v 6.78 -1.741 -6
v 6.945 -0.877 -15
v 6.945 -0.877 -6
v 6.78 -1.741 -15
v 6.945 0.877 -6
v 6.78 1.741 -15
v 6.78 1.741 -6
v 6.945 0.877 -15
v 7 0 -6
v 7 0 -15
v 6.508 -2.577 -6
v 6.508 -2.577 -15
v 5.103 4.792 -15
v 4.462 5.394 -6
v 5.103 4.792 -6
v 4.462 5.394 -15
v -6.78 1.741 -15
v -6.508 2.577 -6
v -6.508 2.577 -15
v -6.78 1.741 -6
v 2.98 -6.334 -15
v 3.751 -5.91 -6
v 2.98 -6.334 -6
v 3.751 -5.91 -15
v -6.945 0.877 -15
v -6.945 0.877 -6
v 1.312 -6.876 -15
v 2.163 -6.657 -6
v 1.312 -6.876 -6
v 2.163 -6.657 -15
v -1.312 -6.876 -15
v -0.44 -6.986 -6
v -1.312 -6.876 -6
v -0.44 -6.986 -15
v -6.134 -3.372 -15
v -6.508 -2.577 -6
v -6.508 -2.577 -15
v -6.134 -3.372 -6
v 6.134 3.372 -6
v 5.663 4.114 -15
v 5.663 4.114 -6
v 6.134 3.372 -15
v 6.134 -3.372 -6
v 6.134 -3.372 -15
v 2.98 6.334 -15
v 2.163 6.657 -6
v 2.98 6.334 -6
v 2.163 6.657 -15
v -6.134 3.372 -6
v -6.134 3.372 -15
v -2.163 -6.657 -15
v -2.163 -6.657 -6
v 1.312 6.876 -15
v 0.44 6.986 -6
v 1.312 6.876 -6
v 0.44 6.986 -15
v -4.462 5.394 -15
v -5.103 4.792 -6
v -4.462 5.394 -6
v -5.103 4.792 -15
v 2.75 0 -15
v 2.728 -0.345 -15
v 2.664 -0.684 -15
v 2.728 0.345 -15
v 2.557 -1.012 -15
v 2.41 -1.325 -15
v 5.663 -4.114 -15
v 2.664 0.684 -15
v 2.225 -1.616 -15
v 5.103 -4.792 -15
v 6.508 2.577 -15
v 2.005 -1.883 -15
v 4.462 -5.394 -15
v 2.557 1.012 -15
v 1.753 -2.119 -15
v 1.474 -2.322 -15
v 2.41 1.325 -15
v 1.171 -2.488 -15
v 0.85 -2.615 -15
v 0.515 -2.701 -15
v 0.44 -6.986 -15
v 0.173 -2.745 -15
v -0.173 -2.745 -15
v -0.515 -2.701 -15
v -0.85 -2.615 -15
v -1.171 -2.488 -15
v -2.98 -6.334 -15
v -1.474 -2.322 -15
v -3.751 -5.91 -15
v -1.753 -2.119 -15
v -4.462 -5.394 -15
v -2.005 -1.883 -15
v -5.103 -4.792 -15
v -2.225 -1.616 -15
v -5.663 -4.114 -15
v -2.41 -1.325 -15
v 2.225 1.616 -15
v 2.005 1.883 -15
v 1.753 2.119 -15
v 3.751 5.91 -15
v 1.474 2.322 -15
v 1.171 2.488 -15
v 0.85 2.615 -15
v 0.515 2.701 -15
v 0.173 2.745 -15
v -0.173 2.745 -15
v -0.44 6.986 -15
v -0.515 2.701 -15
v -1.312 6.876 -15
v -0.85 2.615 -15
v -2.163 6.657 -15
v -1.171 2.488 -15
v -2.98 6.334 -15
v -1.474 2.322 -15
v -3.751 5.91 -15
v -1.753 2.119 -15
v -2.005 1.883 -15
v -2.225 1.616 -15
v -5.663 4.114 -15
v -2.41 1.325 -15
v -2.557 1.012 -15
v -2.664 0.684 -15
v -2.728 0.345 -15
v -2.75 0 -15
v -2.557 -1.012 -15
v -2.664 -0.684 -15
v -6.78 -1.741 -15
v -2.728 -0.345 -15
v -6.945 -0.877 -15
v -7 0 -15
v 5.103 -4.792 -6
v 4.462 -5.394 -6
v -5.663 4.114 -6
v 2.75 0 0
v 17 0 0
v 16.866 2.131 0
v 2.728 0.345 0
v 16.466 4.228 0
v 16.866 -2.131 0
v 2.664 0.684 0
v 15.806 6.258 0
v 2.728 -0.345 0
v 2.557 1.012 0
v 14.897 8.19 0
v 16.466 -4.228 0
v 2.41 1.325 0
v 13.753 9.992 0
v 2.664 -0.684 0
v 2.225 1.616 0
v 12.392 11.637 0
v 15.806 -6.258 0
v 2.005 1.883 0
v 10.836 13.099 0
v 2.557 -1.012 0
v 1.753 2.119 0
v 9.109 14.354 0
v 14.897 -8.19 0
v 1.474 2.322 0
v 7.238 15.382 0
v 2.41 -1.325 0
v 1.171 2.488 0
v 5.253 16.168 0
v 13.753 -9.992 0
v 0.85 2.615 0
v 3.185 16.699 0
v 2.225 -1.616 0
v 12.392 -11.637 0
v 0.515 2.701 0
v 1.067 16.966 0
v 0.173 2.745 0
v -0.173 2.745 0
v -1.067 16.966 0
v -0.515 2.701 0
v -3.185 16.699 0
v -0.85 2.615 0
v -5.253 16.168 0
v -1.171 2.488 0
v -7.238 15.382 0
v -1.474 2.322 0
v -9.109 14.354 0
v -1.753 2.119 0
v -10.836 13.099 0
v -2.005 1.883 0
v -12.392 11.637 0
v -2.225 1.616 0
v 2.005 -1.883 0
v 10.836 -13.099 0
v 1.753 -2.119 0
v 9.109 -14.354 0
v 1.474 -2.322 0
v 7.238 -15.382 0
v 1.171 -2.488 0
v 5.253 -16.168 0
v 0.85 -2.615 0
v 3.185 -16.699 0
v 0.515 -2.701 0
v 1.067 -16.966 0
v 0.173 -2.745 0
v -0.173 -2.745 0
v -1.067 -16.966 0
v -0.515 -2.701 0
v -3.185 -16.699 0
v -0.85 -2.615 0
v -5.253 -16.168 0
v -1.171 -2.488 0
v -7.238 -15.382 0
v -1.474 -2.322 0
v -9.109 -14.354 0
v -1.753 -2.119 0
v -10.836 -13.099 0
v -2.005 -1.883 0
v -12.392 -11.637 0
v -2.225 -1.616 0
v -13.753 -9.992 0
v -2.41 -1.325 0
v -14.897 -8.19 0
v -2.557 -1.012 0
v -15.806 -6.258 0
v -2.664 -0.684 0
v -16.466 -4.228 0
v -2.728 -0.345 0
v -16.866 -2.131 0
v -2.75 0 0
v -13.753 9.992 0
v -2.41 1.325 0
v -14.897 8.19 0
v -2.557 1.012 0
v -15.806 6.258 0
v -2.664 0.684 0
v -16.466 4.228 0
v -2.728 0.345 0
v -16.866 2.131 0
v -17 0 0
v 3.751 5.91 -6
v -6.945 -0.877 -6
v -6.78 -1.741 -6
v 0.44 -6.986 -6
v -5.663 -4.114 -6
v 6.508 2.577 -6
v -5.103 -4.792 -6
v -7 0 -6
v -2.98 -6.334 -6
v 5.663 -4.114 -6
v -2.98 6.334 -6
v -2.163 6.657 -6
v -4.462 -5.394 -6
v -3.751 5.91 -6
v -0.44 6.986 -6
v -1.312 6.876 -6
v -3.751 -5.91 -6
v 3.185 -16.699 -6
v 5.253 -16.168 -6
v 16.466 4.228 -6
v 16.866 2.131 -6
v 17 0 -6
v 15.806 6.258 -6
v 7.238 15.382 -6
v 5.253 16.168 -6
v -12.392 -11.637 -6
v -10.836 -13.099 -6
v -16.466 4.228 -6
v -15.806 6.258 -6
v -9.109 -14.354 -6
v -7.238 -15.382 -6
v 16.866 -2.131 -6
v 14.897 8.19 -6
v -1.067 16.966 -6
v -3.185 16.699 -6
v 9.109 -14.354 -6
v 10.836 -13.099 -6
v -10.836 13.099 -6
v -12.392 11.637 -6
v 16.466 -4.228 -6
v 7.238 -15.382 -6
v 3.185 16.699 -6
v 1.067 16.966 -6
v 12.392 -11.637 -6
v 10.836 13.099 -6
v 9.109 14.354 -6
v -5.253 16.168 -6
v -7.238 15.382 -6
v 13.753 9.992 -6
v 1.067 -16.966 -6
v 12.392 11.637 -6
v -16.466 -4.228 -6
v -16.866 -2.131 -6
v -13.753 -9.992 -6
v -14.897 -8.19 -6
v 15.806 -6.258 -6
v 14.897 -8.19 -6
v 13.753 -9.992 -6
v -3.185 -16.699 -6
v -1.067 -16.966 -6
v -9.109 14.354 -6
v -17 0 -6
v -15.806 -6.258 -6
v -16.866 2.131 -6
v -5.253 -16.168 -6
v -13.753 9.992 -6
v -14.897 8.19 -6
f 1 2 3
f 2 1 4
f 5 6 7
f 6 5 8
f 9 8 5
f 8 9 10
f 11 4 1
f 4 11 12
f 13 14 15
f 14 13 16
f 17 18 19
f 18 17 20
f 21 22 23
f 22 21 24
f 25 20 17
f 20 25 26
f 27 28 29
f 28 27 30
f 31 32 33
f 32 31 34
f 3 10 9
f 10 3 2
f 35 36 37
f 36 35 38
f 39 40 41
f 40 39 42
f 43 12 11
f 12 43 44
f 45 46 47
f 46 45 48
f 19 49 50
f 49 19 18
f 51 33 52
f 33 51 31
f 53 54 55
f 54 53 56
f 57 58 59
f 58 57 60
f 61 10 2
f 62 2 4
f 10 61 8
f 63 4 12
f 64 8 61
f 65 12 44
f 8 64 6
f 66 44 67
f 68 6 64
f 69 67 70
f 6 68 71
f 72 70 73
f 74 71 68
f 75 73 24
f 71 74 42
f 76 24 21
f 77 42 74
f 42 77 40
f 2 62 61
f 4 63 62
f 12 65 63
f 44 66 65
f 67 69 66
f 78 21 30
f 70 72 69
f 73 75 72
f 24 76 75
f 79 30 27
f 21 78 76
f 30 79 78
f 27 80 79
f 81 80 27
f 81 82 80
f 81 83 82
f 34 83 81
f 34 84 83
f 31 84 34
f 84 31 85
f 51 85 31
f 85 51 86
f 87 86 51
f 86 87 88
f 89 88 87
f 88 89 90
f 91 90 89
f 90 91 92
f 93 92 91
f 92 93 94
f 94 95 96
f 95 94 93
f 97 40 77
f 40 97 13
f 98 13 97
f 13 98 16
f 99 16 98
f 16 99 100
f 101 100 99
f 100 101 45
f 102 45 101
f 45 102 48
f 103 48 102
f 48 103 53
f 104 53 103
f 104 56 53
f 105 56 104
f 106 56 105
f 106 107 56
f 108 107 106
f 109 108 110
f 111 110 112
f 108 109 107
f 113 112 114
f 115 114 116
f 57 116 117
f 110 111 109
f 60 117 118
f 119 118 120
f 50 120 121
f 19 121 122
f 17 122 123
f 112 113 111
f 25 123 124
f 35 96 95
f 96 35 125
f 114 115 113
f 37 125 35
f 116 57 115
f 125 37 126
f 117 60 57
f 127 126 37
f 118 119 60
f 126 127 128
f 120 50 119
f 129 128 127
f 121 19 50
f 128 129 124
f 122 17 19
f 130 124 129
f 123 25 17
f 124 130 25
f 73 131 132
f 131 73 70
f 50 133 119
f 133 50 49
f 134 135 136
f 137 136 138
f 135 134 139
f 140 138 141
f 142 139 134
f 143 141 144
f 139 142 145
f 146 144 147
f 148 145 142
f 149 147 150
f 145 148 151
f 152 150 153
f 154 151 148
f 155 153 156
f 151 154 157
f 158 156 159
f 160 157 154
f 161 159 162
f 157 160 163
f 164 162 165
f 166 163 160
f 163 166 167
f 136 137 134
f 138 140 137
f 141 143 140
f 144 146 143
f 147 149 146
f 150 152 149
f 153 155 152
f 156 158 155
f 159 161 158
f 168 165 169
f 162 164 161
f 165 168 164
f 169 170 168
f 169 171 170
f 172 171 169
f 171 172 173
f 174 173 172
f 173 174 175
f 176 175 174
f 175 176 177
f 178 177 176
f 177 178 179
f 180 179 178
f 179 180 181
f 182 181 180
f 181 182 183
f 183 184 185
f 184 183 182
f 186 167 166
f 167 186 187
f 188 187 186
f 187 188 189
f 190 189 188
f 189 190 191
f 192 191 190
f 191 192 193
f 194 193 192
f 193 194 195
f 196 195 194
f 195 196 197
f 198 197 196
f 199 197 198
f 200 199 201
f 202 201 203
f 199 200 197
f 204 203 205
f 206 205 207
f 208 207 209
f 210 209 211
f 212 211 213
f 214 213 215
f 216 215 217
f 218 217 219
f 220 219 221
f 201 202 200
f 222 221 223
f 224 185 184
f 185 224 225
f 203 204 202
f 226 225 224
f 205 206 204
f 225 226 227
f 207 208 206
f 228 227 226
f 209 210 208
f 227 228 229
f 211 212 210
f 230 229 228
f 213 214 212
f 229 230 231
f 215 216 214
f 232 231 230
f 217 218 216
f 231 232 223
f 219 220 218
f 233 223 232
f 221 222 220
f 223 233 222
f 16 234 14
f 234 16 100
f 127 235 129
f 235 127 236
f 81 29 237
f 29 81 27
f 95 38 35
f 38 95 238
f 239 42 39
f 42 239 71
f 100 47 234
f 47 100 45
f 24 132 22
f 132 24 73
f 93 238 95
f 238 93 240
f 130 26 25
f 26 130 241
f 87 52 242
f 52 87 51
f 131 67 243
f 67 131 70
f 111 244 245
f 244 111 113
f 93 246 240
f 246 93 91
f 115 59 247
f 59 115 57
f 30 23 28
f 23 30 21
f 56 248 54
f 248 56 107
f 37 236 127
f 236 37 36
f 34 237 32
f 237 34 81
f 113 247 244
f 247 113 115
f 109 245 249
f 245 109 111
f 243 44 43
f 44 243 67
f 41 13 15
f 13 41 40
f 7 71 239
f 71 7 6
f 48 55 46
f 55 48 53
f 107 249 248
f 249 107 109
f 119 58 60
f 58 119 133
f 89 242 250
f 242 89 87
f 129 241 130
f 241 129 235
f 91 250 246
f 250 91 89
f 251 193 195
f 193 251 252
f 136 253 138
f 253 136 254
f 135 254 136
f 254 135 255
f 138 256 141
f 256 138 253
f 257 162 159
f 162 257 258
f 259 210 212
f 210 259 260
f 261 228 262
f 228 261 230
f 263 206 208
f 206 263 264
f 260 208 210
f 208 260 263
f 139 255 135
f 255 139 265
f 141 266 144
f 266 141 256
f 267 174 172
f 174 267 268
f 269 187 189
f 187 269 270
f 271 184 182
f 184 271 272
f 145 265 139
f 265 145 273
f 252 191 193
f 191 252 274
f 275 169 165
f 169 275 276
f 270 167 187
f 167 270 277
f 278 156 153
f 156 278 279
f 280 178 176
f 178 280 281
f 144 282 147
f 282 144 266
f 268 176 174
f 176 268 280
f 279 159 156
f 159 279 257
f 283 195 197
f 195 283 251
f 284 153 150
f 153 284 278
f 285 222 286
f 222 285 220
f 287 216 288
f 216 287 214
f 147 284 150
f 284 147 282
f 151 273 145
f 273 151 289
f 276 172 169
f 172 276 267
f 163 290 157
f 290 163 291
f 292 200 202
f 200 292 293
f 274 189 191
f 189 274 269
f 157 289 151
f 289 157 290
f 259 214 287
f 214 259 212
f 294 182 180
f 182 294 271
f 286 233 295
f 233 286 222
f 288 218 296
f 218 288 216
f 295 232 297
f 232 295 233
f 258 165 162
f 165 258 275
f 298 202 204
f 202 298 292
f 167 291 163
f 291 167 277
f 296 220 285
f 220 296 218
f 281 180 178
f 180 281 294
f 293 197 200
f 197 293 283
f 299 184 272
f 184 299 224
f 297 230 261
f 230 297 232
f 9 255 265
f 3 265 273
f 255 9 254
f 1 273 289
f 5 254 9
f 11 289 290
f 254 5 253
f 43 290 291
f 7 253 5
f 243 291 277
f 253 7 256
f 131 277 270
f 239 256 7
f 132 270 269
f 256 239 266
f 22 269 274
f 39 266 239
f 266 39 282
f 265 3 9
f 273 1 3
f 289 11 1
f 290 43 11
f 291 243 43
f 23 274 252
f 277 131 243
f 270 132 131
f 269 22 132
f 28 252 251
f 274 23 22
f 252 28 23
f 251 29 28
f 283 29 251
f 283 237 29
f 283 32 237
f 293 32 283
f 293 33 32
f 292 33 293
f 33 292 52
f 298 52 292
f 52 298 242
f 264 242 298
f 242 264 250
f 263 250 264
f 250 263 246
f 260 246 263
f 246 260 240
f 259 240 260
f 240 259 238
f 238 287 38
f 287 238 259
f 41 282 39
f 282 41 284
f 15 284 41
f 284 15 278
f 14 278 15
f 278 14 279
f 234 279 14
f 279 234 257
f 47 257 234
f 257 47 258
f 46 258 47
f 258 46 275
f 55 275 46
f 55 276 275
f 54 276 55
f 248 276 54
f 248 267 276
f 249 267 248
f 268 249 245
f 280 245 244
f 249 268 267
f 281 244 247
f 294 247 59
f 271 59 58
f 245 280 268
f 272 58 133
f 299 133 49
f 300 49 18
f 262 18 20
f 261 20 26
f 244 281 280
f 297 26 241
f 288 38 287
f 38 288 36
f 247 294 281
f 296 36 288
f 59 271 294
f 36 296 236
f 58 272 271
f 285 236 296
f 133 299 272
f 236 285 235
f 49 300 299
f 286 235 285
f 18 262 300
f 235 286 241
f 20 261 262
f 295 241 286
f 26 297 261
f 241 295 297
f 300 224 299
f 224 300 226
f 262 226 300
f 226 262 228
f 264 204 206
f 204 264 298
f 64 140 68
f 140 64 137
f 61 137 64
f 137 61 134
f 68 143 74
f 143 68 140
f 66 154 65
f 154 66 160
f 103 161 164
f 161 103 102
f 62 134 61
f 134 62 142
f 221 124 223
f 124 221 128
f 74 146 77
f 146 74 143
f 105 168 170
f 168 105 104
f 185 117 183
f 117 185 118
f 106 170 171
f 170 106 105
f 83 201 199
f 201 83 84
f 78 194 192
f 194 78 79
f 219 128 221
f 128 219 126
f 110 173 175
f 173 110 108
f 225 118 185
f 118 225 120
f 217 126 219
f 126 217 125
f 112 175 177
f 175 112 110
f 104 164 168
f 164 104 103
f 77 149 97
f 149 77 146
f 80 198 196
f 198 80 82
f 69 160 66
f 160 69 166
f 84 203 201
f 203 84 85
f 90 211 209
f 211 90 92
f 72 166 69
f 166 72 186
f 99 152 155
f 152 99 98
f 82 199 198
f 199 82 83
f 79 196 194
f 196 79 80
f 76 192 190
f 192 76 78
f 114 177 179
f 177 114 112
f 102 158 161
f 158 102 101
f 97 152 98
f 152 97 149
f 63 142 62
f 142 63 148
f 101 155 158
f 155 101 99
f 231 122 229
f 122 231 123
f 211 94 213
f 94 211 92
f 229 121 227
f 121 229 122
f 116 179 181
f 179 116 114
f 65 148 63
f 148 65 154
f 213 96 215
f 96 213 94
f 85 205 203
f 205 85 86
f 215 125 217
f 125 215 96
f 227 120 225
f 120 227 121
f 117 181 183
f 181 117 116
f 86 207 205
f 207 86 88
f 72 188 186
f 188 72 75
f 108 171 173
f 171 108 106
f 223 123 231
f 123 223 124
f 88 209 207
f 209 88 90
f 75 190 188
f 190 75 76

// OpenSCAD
$fn = 50;


difference() {
	union() {
		translate(v = [0, 0, -15.0000000000]) {
			cylinder(h = 15, r = 7.0000000000);
		}
		translate(v = [0, 0, -6.0000000000]) {
			cylinder(h = 6, r = 17.0000000000);
		}
	}
	union() {
		#translate(v = [0, 0, -15]) {
			cylinder(h = 15, r = 2.7500000000);
		}
	}
}
